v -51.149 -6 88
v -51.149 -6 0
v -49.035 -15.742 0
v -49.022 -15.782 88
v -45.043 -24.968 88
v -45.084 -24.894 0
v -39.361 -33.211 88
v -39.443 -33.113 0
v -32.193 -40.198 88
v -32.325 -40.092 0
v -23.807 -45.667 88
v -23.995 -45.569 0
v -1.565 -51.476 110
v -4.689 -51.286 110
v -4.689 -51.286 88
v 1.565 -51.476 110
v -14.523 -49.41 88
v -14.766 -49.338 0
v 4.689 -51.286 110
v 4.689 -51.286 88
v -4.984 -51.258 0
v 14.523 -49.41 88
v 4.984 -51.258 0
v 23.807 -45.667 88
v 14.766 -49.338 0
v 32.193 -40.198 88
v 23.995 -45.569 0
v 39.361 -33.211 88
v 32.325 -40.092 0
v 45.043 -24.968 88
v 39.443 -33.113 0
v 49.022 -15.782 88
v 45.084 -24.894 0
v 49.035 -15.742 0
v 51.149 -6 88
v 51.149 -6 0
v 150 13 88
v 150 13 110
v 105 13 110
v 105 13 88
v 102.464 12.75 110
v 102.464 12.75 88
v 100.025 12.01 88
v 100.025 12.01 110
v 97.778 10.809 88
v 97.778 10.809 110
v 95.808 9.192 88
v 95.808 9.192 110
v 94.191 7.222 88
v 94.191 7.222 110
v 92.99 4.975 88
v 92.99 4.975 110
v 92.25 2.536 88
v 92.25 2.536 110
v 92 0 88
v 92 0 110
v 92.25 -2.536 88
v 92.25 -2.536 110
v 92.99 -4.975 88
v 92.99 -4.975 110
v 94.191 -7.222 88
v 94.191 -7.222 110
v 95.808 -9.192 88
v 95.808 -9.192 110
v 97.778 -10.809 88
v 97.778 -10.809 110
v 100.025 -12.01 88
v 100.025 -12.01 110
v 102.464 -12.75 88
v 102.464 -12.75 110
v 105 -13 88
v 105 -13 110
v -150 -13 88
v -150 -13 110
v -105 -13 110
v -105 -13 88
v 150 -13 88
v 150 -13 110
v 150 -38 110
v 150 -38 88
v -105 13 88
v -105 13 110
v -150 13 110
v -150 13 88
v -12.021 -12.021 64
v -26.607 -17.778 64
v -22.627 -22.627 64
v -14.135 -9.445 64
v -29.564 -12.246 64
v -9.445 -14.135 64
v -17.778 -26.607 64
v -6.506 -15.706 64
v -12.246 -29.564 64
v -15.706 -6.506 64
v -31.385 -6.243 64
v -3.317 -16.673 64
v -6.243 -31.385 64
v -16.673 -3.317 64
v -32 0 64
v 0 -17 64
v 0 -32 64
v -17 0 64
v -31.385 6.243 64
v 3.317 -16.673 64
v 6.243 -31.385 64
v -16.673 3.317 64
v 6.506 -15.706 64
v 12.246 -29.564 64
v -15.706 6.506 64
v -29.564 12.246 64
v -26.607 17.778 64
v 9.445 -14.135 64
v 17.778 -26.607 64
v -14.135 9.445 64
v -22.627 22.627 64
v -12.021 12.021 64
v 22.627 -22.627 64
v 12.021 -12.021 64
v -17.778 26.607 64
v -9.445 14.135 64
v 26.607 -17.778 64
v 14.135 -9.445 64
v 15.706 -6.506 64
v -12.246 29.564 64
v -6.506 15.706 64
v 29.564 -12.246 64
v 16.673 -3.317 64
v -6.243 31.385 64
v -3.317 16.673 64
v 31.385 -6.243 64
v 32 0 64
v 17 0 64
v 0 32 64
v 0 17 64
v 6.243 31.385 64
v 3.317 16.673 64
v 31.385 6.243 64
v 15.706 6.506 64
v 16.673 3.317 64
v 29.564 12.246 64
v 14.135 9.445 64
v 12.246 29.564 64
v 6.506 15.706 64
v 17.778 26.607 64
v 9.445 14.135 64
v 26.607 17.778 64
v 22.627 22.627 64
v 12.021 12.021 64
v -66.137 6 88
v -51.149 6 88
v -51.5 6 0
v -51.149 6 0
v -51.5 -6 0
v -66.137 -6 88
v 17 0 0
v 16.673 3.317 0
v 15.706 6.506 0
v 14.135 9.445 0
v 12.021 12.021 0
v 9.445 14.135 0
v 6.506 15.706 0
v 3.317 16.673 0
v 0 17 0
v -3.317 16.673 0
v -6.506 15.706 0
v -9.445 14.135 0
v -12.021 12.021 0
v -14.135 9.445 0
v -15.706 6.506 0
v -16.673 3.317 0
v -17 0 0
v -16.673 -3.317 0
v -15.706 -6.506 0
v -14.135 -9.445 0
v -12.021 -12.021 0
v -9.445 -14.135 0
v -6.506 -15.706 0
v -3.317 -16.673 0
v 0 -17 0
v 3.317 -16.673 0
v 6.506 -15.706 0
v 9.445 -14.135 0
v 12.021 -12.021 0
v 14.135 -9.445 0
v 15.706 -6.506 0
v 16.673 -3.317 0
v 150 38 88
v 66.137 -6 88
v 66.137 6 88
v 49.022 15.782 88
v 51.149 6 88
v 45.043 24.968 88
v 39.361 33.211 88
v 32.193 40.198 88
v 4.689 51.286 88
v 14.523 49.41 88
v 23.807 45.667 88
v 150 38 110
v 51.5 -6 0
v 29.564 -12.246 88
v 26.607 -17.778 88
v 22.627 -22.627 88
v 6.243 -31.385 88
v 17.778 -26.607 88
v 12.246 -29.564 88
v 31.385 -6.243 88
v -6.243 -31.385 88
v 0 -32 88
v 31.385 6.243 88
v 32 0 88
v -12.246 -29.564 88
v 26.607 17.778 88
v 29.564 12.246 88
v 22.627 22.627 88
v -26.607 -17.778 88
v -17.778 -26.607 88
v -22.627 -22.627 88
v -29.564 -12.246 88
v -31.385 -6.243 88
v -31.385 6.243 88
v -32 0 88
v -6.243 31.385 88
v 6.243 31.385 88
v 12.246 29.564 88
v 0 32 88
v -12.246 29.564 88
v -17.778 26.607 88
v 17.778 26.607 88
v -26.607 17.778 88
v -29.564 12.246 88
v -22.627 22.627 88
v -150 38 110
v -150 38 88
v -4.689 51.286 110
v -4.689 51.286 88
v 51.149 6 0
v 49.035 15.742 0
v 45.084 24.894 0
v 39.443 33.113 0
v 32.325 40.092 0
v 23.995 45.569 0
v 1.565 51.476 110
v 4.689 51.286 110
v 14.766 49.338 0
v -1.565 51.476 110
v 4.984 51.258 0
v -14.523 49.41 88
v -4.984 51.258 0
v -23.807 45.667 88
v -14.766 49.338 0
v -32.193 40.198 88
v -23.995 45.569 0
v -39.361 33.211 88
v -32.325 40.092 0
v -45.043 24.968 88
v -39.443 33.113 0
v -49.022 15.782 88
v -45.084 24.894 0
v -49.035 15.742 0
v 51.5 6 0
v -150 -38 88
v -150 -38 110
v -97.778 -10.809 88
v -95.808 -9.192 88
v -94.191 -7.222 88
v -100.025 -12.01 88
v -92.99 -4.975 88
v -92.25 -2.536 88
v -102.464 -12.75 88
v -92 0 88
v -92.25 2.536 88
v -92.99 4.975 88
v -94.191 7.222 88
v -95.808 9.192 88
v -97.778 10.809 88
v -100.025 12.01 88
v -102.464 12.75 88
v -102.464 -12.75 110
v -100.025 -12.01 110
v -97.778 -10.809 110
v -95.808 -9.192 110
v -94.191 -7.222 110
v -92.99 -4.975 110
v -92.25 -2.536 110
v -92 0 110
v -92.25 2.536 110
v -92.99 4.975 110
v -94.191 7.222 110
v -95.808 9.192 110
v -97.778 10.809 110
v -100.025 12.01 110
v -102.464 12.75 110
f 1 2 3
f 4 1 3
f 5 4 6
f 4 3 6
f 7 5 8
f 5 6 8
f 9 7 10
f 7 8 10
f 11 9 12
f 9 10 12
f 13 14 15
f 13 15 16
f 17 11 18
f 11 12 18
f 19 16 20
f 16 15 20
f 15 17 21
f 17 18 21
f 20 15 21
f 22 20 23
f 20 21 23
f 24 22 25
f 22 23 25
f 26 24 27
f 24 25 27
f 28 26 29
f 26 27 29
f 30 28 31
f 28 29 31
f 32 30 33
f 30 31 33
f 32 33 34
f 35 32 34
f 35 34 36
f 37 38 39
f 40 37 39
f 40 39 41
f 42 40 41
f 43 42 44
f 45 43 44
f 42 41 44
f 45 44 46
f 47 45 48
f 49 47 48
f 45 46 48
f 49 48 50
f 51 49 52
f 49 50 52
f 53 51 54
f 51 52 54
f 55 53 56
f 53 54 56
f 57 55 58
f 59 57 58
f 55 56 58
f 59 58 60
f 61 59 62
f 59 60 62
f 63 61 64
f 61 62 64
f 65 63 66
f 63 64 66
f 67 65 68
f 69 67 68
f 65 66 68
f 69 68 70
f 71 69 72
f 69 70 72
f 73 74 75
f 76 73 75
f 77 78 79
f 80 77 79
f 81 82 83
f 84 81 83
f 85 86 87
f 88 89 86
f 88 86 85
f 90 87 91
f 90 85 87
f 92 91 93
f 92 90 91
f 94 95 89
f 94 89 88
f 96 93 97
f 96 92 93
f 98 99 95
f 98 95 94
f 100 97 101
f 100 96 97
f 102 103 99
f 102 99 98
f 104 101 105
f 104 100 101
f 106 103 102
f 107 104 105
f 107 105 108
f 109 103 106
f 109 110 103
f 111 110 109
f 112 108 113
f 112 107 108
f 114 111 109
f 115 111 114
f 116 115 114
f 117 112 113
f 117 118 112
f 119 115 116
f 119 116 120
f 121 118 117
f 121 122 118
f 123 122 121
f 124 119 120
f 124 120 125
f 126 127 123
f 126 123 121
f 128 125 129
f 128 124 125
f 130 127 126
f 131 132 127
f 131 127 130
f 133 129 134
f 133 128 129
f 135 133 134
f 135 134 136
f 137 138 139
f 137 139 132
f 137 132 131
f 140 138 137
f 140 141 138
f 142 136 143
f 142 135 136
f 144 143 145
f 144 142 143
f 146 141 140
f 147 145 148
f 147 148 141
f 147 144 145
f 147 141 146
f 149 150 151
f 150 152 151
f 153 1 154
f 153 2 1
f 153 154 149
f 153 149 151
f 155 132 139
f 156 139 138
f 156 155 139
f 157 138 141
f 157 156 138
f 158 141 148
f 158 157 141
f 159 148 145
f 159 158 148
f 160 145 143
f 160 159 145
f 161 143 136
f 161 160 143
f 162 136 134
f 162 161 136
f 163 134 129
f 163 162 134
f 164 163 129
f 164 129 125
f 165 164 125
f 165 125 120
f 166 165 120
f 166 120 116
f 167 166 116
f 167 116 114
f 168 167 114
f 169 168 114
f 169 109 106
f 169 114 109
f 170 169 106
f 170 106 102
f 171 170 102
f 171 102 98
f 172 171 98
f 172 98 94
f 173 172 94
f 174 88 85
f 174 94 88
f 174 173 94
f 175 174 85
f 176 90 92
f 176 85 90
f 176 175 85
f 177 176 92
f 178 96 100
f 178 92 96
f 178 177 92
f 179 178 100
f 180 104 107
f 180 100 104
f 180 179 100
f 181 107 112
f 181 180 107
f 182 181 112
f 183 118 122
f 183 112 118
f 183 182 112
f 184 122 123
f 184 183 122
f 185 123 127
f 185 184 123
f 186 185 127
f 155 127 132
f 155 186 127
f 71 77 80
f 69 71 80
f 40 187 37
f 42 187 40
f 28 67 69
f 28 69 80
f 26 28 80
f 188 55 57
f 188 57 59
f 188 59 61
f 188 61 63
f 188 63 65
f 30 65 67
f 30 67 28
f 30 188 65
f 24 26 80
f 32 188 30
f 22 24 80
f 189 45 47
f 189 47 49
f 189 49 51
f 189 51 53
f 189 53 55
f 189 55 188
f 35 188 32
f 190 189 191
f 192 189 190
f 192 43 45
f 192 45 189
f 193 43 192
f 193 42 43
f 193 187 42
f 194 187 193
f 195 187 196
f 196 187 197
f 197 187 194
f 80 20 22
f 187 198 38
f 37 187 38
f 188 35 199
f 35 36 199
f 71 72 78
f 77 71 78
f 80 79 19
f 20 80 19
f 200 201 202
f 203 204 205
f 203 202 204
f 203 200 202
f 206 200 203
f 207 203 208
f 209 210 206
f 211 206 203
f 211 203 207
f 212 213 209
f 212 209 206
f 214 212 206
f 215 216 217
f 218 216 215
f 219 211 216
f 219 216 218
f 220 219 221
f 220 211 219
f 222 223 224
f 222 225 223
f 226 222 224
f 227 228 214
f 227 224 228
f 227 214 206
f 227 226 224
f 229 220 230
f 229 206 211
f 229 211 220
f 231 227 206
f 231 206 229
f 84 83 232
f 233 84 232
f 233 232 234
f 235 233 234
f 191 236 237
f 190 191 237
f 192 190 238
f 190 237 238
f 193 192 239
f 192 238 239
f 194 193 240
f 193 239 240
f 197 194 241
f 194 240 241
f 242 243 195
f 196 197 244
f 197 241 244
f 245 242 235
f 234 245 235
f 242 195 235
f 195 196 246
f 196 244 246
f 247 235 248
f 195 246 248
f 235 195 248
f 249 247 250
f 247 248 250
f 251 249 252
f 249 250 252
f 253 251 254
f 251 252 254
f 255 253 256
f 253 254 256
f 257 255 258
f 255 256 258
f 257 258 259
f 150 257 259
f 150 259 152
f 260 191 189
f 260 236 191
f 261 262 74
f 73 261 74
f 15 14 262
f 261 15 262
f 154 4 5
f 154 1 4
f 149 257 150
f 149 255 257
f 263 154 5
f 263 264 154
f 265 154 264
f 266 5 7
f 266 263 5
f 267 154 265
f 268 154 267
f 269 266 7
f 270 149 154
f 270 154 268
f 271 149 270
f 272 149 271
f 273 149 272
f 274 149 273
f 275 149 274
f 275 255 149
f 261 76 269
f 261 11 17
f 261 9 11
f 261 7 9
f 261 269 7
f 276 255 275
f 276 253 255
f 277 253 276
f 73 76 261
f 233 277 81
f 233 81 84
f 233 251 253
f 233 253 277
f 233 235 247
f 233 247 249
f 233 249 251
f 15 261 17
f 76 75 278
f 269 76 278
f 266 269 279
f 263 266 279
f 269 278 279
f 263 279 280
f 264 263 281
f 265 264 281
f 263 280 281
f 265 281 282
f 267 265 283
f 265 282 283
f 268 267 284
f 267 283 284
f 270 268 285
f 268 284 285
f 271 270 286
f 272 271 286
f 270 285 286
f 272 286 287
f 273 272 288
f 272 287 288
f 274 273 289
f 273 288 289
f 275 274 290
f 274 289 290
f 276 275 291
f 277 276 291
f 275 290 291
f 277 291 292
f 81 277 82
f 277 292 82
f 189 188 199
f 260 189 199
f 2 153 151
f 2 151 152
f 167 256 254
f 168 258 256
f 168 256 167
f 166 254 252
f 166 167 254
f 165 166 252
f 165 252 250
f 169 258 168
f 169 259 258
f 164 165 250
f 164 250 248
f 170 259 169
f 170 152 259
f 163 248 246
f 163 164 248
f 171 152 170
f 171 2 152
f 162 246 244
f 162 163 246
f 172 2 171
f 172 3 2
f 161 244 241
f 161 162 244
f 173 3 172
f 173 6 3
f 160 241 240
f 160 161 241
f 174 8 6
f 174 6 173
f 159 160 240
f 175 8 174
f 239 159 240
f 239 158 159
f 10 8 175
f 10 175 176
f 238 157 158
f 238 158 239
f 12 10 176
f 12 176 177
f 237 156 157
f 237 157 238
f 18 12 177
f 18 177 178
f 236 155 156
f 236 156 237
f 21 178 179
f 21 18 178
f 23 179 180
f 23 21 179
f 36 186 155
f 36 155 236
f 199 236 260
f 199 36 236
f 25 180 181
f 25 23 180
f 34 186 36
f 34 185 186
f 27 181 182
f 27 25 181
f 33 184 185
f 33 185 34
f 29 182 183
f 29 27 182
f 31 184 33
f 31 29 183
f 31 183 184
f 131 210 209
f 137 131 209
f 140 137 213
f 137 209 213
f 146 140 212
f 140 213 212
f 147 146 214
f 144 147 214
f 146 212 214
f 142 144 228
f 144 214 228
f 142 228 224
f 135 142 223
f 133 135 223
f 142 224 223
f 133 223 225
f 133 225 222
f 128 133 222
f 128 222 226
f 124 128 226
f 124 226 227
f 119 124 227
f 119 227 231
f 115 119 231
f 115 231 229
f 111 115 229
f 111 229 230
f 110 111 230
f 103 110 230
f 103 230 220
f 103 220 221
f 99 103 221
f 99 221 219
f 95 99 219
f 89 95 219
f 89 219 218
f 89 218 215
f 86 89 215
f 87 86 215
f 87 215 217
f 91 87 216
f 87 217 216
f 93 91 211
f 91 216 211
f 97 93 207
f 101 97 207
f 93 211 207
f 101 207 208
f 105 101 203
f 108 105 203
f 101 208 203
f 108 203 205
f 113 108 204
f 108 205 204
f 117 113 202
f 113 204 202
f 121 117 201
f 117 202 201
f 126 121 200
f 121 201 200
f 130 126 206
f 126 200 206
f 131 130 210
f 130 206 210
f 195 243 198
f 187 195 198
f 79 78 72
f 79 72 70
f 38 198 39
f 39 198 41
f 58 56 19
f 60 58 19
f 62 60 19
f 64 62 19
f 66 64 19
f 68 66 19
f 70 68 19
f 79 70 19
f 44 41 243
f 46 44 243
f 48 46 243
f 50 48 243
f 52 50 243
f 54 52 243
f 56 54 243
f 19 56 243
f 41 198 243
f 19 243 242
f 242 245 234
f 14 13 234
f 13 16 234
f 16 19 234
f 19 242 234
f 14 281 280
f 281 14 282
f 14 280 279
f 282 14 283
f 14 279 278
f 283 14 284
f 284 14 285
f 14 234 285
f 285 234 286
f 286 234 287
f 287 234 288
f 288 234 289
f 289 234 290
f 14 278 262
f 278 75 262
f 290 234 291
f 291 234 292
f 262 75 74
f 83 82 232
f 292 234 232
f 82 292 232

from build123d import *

# Parameters (mm, degrees)
SZKIC5_R                    = 51.5
DODANIE_WYCI_GNI_CIE5_DEPTH = 110
SZKIC6_R                    = 17
WYTNIJ_WYCI_GNI_CIE3_DEPTH  = 66
SZKIC8_R                    = 32
WYTNIJ_WYCI_GNI_CIE4_DEPTH  = 46
DODANIE_WYCI_GNI_CIE7_DEPTH = 22
EBRO3_START                 = -6
EBRO3_DEPTH                 = 12


# Read off the part's stored shape, not the designer's step: Żebro3
with BuildPart() as part:
    # Szkic5 → Dodanie-wyciągnięcie5 (new body)
    with BuildSketch(Plane.XY):
        Circle(SZKIC5_R)
    extrude(amount=DODANIE_WYCI_GNI_CIE5_DEPTH)

    # Szkic6 → Wytnij-wyciągnięcie3 (cut)
    with BuildSketch(Plane.XY):
        Circle(SZKIC6_R)
    extrude(amount=WYTNIJ_WYCI_GNI_CIE3_DEPTH, mode=Mode.SUBTRACT)

    # Szkic8 → Wytnij-wyciągnięcie4 (cut)
    with BuildSketch(Plane.XY.offset(110)):
        Circle(SZKIC8_R)
    extrude(amount=-WYTNIJ_WYCI_GNI_CIE4_DEPTH, mode=Mode.SUBTRACT)

    # Szkic9 → Dodanie-wyciągnięcie7 (add)
    with BuildSketch(Plane.XY.offset(110)):
        with BuildLine():
            Line((-150, 13), (-150, 38))
            Line((-150, 38), (-4.689194415, 51.286074677))
            Line((-4.689194415, 51.286074677), (4.689194415, 51.286074677))
            Line((4.689194415, 51.286074677), (150, 38))
            Line((150, 38), (150, 13))
            Line((150, 13), (105, 13))
            ThreePointArc((105, 13), (92, 0), (105, -13))
            Line((105, -13), (150, -13))
            Line((150, -13), (150, -38))
            Line((150, -38), (4.689194415, -51.286074677))
            Line((4.689194415, -51.286074677), (-4.689194415, -51.286074677))
            Line((-4.689194415, -51.286074677), (-150, -38))
            Line((-150, -38), (-150, -13))
            Line((-150, -13), (-105, -13))
            ThreePointArc((-105, -13), (-92, 0), (-105, 13))
            Line((-105, 13), (-150, 13))
        make_face()
    extrude(amount=-DODANIE_WYCI_GNI_CIE7_DEPTH)

    # Żebro3 outline → Żebro3 (add)
    with BuildSketch(Plane(origin=(0, 0, 0), x_dir=(1, 0, 0), z_dir=(0, 1, 0)).offset(EBRO3_START)):
        Polygon((66.136905435, -88), (51.5, 0), (51, 0), (51, -89), (66.303233906, -89), align=None)
    ebro3 = extrude(amount=EBRO3_DEPTH)

    # Lustro2: Żebro3 across plane
    add(ebro3.mirror(Plane(origin=(0, 0, 0), x_dir=(0, 0, 1), z_dir=(1, 0, 0))))


solid = part.part
